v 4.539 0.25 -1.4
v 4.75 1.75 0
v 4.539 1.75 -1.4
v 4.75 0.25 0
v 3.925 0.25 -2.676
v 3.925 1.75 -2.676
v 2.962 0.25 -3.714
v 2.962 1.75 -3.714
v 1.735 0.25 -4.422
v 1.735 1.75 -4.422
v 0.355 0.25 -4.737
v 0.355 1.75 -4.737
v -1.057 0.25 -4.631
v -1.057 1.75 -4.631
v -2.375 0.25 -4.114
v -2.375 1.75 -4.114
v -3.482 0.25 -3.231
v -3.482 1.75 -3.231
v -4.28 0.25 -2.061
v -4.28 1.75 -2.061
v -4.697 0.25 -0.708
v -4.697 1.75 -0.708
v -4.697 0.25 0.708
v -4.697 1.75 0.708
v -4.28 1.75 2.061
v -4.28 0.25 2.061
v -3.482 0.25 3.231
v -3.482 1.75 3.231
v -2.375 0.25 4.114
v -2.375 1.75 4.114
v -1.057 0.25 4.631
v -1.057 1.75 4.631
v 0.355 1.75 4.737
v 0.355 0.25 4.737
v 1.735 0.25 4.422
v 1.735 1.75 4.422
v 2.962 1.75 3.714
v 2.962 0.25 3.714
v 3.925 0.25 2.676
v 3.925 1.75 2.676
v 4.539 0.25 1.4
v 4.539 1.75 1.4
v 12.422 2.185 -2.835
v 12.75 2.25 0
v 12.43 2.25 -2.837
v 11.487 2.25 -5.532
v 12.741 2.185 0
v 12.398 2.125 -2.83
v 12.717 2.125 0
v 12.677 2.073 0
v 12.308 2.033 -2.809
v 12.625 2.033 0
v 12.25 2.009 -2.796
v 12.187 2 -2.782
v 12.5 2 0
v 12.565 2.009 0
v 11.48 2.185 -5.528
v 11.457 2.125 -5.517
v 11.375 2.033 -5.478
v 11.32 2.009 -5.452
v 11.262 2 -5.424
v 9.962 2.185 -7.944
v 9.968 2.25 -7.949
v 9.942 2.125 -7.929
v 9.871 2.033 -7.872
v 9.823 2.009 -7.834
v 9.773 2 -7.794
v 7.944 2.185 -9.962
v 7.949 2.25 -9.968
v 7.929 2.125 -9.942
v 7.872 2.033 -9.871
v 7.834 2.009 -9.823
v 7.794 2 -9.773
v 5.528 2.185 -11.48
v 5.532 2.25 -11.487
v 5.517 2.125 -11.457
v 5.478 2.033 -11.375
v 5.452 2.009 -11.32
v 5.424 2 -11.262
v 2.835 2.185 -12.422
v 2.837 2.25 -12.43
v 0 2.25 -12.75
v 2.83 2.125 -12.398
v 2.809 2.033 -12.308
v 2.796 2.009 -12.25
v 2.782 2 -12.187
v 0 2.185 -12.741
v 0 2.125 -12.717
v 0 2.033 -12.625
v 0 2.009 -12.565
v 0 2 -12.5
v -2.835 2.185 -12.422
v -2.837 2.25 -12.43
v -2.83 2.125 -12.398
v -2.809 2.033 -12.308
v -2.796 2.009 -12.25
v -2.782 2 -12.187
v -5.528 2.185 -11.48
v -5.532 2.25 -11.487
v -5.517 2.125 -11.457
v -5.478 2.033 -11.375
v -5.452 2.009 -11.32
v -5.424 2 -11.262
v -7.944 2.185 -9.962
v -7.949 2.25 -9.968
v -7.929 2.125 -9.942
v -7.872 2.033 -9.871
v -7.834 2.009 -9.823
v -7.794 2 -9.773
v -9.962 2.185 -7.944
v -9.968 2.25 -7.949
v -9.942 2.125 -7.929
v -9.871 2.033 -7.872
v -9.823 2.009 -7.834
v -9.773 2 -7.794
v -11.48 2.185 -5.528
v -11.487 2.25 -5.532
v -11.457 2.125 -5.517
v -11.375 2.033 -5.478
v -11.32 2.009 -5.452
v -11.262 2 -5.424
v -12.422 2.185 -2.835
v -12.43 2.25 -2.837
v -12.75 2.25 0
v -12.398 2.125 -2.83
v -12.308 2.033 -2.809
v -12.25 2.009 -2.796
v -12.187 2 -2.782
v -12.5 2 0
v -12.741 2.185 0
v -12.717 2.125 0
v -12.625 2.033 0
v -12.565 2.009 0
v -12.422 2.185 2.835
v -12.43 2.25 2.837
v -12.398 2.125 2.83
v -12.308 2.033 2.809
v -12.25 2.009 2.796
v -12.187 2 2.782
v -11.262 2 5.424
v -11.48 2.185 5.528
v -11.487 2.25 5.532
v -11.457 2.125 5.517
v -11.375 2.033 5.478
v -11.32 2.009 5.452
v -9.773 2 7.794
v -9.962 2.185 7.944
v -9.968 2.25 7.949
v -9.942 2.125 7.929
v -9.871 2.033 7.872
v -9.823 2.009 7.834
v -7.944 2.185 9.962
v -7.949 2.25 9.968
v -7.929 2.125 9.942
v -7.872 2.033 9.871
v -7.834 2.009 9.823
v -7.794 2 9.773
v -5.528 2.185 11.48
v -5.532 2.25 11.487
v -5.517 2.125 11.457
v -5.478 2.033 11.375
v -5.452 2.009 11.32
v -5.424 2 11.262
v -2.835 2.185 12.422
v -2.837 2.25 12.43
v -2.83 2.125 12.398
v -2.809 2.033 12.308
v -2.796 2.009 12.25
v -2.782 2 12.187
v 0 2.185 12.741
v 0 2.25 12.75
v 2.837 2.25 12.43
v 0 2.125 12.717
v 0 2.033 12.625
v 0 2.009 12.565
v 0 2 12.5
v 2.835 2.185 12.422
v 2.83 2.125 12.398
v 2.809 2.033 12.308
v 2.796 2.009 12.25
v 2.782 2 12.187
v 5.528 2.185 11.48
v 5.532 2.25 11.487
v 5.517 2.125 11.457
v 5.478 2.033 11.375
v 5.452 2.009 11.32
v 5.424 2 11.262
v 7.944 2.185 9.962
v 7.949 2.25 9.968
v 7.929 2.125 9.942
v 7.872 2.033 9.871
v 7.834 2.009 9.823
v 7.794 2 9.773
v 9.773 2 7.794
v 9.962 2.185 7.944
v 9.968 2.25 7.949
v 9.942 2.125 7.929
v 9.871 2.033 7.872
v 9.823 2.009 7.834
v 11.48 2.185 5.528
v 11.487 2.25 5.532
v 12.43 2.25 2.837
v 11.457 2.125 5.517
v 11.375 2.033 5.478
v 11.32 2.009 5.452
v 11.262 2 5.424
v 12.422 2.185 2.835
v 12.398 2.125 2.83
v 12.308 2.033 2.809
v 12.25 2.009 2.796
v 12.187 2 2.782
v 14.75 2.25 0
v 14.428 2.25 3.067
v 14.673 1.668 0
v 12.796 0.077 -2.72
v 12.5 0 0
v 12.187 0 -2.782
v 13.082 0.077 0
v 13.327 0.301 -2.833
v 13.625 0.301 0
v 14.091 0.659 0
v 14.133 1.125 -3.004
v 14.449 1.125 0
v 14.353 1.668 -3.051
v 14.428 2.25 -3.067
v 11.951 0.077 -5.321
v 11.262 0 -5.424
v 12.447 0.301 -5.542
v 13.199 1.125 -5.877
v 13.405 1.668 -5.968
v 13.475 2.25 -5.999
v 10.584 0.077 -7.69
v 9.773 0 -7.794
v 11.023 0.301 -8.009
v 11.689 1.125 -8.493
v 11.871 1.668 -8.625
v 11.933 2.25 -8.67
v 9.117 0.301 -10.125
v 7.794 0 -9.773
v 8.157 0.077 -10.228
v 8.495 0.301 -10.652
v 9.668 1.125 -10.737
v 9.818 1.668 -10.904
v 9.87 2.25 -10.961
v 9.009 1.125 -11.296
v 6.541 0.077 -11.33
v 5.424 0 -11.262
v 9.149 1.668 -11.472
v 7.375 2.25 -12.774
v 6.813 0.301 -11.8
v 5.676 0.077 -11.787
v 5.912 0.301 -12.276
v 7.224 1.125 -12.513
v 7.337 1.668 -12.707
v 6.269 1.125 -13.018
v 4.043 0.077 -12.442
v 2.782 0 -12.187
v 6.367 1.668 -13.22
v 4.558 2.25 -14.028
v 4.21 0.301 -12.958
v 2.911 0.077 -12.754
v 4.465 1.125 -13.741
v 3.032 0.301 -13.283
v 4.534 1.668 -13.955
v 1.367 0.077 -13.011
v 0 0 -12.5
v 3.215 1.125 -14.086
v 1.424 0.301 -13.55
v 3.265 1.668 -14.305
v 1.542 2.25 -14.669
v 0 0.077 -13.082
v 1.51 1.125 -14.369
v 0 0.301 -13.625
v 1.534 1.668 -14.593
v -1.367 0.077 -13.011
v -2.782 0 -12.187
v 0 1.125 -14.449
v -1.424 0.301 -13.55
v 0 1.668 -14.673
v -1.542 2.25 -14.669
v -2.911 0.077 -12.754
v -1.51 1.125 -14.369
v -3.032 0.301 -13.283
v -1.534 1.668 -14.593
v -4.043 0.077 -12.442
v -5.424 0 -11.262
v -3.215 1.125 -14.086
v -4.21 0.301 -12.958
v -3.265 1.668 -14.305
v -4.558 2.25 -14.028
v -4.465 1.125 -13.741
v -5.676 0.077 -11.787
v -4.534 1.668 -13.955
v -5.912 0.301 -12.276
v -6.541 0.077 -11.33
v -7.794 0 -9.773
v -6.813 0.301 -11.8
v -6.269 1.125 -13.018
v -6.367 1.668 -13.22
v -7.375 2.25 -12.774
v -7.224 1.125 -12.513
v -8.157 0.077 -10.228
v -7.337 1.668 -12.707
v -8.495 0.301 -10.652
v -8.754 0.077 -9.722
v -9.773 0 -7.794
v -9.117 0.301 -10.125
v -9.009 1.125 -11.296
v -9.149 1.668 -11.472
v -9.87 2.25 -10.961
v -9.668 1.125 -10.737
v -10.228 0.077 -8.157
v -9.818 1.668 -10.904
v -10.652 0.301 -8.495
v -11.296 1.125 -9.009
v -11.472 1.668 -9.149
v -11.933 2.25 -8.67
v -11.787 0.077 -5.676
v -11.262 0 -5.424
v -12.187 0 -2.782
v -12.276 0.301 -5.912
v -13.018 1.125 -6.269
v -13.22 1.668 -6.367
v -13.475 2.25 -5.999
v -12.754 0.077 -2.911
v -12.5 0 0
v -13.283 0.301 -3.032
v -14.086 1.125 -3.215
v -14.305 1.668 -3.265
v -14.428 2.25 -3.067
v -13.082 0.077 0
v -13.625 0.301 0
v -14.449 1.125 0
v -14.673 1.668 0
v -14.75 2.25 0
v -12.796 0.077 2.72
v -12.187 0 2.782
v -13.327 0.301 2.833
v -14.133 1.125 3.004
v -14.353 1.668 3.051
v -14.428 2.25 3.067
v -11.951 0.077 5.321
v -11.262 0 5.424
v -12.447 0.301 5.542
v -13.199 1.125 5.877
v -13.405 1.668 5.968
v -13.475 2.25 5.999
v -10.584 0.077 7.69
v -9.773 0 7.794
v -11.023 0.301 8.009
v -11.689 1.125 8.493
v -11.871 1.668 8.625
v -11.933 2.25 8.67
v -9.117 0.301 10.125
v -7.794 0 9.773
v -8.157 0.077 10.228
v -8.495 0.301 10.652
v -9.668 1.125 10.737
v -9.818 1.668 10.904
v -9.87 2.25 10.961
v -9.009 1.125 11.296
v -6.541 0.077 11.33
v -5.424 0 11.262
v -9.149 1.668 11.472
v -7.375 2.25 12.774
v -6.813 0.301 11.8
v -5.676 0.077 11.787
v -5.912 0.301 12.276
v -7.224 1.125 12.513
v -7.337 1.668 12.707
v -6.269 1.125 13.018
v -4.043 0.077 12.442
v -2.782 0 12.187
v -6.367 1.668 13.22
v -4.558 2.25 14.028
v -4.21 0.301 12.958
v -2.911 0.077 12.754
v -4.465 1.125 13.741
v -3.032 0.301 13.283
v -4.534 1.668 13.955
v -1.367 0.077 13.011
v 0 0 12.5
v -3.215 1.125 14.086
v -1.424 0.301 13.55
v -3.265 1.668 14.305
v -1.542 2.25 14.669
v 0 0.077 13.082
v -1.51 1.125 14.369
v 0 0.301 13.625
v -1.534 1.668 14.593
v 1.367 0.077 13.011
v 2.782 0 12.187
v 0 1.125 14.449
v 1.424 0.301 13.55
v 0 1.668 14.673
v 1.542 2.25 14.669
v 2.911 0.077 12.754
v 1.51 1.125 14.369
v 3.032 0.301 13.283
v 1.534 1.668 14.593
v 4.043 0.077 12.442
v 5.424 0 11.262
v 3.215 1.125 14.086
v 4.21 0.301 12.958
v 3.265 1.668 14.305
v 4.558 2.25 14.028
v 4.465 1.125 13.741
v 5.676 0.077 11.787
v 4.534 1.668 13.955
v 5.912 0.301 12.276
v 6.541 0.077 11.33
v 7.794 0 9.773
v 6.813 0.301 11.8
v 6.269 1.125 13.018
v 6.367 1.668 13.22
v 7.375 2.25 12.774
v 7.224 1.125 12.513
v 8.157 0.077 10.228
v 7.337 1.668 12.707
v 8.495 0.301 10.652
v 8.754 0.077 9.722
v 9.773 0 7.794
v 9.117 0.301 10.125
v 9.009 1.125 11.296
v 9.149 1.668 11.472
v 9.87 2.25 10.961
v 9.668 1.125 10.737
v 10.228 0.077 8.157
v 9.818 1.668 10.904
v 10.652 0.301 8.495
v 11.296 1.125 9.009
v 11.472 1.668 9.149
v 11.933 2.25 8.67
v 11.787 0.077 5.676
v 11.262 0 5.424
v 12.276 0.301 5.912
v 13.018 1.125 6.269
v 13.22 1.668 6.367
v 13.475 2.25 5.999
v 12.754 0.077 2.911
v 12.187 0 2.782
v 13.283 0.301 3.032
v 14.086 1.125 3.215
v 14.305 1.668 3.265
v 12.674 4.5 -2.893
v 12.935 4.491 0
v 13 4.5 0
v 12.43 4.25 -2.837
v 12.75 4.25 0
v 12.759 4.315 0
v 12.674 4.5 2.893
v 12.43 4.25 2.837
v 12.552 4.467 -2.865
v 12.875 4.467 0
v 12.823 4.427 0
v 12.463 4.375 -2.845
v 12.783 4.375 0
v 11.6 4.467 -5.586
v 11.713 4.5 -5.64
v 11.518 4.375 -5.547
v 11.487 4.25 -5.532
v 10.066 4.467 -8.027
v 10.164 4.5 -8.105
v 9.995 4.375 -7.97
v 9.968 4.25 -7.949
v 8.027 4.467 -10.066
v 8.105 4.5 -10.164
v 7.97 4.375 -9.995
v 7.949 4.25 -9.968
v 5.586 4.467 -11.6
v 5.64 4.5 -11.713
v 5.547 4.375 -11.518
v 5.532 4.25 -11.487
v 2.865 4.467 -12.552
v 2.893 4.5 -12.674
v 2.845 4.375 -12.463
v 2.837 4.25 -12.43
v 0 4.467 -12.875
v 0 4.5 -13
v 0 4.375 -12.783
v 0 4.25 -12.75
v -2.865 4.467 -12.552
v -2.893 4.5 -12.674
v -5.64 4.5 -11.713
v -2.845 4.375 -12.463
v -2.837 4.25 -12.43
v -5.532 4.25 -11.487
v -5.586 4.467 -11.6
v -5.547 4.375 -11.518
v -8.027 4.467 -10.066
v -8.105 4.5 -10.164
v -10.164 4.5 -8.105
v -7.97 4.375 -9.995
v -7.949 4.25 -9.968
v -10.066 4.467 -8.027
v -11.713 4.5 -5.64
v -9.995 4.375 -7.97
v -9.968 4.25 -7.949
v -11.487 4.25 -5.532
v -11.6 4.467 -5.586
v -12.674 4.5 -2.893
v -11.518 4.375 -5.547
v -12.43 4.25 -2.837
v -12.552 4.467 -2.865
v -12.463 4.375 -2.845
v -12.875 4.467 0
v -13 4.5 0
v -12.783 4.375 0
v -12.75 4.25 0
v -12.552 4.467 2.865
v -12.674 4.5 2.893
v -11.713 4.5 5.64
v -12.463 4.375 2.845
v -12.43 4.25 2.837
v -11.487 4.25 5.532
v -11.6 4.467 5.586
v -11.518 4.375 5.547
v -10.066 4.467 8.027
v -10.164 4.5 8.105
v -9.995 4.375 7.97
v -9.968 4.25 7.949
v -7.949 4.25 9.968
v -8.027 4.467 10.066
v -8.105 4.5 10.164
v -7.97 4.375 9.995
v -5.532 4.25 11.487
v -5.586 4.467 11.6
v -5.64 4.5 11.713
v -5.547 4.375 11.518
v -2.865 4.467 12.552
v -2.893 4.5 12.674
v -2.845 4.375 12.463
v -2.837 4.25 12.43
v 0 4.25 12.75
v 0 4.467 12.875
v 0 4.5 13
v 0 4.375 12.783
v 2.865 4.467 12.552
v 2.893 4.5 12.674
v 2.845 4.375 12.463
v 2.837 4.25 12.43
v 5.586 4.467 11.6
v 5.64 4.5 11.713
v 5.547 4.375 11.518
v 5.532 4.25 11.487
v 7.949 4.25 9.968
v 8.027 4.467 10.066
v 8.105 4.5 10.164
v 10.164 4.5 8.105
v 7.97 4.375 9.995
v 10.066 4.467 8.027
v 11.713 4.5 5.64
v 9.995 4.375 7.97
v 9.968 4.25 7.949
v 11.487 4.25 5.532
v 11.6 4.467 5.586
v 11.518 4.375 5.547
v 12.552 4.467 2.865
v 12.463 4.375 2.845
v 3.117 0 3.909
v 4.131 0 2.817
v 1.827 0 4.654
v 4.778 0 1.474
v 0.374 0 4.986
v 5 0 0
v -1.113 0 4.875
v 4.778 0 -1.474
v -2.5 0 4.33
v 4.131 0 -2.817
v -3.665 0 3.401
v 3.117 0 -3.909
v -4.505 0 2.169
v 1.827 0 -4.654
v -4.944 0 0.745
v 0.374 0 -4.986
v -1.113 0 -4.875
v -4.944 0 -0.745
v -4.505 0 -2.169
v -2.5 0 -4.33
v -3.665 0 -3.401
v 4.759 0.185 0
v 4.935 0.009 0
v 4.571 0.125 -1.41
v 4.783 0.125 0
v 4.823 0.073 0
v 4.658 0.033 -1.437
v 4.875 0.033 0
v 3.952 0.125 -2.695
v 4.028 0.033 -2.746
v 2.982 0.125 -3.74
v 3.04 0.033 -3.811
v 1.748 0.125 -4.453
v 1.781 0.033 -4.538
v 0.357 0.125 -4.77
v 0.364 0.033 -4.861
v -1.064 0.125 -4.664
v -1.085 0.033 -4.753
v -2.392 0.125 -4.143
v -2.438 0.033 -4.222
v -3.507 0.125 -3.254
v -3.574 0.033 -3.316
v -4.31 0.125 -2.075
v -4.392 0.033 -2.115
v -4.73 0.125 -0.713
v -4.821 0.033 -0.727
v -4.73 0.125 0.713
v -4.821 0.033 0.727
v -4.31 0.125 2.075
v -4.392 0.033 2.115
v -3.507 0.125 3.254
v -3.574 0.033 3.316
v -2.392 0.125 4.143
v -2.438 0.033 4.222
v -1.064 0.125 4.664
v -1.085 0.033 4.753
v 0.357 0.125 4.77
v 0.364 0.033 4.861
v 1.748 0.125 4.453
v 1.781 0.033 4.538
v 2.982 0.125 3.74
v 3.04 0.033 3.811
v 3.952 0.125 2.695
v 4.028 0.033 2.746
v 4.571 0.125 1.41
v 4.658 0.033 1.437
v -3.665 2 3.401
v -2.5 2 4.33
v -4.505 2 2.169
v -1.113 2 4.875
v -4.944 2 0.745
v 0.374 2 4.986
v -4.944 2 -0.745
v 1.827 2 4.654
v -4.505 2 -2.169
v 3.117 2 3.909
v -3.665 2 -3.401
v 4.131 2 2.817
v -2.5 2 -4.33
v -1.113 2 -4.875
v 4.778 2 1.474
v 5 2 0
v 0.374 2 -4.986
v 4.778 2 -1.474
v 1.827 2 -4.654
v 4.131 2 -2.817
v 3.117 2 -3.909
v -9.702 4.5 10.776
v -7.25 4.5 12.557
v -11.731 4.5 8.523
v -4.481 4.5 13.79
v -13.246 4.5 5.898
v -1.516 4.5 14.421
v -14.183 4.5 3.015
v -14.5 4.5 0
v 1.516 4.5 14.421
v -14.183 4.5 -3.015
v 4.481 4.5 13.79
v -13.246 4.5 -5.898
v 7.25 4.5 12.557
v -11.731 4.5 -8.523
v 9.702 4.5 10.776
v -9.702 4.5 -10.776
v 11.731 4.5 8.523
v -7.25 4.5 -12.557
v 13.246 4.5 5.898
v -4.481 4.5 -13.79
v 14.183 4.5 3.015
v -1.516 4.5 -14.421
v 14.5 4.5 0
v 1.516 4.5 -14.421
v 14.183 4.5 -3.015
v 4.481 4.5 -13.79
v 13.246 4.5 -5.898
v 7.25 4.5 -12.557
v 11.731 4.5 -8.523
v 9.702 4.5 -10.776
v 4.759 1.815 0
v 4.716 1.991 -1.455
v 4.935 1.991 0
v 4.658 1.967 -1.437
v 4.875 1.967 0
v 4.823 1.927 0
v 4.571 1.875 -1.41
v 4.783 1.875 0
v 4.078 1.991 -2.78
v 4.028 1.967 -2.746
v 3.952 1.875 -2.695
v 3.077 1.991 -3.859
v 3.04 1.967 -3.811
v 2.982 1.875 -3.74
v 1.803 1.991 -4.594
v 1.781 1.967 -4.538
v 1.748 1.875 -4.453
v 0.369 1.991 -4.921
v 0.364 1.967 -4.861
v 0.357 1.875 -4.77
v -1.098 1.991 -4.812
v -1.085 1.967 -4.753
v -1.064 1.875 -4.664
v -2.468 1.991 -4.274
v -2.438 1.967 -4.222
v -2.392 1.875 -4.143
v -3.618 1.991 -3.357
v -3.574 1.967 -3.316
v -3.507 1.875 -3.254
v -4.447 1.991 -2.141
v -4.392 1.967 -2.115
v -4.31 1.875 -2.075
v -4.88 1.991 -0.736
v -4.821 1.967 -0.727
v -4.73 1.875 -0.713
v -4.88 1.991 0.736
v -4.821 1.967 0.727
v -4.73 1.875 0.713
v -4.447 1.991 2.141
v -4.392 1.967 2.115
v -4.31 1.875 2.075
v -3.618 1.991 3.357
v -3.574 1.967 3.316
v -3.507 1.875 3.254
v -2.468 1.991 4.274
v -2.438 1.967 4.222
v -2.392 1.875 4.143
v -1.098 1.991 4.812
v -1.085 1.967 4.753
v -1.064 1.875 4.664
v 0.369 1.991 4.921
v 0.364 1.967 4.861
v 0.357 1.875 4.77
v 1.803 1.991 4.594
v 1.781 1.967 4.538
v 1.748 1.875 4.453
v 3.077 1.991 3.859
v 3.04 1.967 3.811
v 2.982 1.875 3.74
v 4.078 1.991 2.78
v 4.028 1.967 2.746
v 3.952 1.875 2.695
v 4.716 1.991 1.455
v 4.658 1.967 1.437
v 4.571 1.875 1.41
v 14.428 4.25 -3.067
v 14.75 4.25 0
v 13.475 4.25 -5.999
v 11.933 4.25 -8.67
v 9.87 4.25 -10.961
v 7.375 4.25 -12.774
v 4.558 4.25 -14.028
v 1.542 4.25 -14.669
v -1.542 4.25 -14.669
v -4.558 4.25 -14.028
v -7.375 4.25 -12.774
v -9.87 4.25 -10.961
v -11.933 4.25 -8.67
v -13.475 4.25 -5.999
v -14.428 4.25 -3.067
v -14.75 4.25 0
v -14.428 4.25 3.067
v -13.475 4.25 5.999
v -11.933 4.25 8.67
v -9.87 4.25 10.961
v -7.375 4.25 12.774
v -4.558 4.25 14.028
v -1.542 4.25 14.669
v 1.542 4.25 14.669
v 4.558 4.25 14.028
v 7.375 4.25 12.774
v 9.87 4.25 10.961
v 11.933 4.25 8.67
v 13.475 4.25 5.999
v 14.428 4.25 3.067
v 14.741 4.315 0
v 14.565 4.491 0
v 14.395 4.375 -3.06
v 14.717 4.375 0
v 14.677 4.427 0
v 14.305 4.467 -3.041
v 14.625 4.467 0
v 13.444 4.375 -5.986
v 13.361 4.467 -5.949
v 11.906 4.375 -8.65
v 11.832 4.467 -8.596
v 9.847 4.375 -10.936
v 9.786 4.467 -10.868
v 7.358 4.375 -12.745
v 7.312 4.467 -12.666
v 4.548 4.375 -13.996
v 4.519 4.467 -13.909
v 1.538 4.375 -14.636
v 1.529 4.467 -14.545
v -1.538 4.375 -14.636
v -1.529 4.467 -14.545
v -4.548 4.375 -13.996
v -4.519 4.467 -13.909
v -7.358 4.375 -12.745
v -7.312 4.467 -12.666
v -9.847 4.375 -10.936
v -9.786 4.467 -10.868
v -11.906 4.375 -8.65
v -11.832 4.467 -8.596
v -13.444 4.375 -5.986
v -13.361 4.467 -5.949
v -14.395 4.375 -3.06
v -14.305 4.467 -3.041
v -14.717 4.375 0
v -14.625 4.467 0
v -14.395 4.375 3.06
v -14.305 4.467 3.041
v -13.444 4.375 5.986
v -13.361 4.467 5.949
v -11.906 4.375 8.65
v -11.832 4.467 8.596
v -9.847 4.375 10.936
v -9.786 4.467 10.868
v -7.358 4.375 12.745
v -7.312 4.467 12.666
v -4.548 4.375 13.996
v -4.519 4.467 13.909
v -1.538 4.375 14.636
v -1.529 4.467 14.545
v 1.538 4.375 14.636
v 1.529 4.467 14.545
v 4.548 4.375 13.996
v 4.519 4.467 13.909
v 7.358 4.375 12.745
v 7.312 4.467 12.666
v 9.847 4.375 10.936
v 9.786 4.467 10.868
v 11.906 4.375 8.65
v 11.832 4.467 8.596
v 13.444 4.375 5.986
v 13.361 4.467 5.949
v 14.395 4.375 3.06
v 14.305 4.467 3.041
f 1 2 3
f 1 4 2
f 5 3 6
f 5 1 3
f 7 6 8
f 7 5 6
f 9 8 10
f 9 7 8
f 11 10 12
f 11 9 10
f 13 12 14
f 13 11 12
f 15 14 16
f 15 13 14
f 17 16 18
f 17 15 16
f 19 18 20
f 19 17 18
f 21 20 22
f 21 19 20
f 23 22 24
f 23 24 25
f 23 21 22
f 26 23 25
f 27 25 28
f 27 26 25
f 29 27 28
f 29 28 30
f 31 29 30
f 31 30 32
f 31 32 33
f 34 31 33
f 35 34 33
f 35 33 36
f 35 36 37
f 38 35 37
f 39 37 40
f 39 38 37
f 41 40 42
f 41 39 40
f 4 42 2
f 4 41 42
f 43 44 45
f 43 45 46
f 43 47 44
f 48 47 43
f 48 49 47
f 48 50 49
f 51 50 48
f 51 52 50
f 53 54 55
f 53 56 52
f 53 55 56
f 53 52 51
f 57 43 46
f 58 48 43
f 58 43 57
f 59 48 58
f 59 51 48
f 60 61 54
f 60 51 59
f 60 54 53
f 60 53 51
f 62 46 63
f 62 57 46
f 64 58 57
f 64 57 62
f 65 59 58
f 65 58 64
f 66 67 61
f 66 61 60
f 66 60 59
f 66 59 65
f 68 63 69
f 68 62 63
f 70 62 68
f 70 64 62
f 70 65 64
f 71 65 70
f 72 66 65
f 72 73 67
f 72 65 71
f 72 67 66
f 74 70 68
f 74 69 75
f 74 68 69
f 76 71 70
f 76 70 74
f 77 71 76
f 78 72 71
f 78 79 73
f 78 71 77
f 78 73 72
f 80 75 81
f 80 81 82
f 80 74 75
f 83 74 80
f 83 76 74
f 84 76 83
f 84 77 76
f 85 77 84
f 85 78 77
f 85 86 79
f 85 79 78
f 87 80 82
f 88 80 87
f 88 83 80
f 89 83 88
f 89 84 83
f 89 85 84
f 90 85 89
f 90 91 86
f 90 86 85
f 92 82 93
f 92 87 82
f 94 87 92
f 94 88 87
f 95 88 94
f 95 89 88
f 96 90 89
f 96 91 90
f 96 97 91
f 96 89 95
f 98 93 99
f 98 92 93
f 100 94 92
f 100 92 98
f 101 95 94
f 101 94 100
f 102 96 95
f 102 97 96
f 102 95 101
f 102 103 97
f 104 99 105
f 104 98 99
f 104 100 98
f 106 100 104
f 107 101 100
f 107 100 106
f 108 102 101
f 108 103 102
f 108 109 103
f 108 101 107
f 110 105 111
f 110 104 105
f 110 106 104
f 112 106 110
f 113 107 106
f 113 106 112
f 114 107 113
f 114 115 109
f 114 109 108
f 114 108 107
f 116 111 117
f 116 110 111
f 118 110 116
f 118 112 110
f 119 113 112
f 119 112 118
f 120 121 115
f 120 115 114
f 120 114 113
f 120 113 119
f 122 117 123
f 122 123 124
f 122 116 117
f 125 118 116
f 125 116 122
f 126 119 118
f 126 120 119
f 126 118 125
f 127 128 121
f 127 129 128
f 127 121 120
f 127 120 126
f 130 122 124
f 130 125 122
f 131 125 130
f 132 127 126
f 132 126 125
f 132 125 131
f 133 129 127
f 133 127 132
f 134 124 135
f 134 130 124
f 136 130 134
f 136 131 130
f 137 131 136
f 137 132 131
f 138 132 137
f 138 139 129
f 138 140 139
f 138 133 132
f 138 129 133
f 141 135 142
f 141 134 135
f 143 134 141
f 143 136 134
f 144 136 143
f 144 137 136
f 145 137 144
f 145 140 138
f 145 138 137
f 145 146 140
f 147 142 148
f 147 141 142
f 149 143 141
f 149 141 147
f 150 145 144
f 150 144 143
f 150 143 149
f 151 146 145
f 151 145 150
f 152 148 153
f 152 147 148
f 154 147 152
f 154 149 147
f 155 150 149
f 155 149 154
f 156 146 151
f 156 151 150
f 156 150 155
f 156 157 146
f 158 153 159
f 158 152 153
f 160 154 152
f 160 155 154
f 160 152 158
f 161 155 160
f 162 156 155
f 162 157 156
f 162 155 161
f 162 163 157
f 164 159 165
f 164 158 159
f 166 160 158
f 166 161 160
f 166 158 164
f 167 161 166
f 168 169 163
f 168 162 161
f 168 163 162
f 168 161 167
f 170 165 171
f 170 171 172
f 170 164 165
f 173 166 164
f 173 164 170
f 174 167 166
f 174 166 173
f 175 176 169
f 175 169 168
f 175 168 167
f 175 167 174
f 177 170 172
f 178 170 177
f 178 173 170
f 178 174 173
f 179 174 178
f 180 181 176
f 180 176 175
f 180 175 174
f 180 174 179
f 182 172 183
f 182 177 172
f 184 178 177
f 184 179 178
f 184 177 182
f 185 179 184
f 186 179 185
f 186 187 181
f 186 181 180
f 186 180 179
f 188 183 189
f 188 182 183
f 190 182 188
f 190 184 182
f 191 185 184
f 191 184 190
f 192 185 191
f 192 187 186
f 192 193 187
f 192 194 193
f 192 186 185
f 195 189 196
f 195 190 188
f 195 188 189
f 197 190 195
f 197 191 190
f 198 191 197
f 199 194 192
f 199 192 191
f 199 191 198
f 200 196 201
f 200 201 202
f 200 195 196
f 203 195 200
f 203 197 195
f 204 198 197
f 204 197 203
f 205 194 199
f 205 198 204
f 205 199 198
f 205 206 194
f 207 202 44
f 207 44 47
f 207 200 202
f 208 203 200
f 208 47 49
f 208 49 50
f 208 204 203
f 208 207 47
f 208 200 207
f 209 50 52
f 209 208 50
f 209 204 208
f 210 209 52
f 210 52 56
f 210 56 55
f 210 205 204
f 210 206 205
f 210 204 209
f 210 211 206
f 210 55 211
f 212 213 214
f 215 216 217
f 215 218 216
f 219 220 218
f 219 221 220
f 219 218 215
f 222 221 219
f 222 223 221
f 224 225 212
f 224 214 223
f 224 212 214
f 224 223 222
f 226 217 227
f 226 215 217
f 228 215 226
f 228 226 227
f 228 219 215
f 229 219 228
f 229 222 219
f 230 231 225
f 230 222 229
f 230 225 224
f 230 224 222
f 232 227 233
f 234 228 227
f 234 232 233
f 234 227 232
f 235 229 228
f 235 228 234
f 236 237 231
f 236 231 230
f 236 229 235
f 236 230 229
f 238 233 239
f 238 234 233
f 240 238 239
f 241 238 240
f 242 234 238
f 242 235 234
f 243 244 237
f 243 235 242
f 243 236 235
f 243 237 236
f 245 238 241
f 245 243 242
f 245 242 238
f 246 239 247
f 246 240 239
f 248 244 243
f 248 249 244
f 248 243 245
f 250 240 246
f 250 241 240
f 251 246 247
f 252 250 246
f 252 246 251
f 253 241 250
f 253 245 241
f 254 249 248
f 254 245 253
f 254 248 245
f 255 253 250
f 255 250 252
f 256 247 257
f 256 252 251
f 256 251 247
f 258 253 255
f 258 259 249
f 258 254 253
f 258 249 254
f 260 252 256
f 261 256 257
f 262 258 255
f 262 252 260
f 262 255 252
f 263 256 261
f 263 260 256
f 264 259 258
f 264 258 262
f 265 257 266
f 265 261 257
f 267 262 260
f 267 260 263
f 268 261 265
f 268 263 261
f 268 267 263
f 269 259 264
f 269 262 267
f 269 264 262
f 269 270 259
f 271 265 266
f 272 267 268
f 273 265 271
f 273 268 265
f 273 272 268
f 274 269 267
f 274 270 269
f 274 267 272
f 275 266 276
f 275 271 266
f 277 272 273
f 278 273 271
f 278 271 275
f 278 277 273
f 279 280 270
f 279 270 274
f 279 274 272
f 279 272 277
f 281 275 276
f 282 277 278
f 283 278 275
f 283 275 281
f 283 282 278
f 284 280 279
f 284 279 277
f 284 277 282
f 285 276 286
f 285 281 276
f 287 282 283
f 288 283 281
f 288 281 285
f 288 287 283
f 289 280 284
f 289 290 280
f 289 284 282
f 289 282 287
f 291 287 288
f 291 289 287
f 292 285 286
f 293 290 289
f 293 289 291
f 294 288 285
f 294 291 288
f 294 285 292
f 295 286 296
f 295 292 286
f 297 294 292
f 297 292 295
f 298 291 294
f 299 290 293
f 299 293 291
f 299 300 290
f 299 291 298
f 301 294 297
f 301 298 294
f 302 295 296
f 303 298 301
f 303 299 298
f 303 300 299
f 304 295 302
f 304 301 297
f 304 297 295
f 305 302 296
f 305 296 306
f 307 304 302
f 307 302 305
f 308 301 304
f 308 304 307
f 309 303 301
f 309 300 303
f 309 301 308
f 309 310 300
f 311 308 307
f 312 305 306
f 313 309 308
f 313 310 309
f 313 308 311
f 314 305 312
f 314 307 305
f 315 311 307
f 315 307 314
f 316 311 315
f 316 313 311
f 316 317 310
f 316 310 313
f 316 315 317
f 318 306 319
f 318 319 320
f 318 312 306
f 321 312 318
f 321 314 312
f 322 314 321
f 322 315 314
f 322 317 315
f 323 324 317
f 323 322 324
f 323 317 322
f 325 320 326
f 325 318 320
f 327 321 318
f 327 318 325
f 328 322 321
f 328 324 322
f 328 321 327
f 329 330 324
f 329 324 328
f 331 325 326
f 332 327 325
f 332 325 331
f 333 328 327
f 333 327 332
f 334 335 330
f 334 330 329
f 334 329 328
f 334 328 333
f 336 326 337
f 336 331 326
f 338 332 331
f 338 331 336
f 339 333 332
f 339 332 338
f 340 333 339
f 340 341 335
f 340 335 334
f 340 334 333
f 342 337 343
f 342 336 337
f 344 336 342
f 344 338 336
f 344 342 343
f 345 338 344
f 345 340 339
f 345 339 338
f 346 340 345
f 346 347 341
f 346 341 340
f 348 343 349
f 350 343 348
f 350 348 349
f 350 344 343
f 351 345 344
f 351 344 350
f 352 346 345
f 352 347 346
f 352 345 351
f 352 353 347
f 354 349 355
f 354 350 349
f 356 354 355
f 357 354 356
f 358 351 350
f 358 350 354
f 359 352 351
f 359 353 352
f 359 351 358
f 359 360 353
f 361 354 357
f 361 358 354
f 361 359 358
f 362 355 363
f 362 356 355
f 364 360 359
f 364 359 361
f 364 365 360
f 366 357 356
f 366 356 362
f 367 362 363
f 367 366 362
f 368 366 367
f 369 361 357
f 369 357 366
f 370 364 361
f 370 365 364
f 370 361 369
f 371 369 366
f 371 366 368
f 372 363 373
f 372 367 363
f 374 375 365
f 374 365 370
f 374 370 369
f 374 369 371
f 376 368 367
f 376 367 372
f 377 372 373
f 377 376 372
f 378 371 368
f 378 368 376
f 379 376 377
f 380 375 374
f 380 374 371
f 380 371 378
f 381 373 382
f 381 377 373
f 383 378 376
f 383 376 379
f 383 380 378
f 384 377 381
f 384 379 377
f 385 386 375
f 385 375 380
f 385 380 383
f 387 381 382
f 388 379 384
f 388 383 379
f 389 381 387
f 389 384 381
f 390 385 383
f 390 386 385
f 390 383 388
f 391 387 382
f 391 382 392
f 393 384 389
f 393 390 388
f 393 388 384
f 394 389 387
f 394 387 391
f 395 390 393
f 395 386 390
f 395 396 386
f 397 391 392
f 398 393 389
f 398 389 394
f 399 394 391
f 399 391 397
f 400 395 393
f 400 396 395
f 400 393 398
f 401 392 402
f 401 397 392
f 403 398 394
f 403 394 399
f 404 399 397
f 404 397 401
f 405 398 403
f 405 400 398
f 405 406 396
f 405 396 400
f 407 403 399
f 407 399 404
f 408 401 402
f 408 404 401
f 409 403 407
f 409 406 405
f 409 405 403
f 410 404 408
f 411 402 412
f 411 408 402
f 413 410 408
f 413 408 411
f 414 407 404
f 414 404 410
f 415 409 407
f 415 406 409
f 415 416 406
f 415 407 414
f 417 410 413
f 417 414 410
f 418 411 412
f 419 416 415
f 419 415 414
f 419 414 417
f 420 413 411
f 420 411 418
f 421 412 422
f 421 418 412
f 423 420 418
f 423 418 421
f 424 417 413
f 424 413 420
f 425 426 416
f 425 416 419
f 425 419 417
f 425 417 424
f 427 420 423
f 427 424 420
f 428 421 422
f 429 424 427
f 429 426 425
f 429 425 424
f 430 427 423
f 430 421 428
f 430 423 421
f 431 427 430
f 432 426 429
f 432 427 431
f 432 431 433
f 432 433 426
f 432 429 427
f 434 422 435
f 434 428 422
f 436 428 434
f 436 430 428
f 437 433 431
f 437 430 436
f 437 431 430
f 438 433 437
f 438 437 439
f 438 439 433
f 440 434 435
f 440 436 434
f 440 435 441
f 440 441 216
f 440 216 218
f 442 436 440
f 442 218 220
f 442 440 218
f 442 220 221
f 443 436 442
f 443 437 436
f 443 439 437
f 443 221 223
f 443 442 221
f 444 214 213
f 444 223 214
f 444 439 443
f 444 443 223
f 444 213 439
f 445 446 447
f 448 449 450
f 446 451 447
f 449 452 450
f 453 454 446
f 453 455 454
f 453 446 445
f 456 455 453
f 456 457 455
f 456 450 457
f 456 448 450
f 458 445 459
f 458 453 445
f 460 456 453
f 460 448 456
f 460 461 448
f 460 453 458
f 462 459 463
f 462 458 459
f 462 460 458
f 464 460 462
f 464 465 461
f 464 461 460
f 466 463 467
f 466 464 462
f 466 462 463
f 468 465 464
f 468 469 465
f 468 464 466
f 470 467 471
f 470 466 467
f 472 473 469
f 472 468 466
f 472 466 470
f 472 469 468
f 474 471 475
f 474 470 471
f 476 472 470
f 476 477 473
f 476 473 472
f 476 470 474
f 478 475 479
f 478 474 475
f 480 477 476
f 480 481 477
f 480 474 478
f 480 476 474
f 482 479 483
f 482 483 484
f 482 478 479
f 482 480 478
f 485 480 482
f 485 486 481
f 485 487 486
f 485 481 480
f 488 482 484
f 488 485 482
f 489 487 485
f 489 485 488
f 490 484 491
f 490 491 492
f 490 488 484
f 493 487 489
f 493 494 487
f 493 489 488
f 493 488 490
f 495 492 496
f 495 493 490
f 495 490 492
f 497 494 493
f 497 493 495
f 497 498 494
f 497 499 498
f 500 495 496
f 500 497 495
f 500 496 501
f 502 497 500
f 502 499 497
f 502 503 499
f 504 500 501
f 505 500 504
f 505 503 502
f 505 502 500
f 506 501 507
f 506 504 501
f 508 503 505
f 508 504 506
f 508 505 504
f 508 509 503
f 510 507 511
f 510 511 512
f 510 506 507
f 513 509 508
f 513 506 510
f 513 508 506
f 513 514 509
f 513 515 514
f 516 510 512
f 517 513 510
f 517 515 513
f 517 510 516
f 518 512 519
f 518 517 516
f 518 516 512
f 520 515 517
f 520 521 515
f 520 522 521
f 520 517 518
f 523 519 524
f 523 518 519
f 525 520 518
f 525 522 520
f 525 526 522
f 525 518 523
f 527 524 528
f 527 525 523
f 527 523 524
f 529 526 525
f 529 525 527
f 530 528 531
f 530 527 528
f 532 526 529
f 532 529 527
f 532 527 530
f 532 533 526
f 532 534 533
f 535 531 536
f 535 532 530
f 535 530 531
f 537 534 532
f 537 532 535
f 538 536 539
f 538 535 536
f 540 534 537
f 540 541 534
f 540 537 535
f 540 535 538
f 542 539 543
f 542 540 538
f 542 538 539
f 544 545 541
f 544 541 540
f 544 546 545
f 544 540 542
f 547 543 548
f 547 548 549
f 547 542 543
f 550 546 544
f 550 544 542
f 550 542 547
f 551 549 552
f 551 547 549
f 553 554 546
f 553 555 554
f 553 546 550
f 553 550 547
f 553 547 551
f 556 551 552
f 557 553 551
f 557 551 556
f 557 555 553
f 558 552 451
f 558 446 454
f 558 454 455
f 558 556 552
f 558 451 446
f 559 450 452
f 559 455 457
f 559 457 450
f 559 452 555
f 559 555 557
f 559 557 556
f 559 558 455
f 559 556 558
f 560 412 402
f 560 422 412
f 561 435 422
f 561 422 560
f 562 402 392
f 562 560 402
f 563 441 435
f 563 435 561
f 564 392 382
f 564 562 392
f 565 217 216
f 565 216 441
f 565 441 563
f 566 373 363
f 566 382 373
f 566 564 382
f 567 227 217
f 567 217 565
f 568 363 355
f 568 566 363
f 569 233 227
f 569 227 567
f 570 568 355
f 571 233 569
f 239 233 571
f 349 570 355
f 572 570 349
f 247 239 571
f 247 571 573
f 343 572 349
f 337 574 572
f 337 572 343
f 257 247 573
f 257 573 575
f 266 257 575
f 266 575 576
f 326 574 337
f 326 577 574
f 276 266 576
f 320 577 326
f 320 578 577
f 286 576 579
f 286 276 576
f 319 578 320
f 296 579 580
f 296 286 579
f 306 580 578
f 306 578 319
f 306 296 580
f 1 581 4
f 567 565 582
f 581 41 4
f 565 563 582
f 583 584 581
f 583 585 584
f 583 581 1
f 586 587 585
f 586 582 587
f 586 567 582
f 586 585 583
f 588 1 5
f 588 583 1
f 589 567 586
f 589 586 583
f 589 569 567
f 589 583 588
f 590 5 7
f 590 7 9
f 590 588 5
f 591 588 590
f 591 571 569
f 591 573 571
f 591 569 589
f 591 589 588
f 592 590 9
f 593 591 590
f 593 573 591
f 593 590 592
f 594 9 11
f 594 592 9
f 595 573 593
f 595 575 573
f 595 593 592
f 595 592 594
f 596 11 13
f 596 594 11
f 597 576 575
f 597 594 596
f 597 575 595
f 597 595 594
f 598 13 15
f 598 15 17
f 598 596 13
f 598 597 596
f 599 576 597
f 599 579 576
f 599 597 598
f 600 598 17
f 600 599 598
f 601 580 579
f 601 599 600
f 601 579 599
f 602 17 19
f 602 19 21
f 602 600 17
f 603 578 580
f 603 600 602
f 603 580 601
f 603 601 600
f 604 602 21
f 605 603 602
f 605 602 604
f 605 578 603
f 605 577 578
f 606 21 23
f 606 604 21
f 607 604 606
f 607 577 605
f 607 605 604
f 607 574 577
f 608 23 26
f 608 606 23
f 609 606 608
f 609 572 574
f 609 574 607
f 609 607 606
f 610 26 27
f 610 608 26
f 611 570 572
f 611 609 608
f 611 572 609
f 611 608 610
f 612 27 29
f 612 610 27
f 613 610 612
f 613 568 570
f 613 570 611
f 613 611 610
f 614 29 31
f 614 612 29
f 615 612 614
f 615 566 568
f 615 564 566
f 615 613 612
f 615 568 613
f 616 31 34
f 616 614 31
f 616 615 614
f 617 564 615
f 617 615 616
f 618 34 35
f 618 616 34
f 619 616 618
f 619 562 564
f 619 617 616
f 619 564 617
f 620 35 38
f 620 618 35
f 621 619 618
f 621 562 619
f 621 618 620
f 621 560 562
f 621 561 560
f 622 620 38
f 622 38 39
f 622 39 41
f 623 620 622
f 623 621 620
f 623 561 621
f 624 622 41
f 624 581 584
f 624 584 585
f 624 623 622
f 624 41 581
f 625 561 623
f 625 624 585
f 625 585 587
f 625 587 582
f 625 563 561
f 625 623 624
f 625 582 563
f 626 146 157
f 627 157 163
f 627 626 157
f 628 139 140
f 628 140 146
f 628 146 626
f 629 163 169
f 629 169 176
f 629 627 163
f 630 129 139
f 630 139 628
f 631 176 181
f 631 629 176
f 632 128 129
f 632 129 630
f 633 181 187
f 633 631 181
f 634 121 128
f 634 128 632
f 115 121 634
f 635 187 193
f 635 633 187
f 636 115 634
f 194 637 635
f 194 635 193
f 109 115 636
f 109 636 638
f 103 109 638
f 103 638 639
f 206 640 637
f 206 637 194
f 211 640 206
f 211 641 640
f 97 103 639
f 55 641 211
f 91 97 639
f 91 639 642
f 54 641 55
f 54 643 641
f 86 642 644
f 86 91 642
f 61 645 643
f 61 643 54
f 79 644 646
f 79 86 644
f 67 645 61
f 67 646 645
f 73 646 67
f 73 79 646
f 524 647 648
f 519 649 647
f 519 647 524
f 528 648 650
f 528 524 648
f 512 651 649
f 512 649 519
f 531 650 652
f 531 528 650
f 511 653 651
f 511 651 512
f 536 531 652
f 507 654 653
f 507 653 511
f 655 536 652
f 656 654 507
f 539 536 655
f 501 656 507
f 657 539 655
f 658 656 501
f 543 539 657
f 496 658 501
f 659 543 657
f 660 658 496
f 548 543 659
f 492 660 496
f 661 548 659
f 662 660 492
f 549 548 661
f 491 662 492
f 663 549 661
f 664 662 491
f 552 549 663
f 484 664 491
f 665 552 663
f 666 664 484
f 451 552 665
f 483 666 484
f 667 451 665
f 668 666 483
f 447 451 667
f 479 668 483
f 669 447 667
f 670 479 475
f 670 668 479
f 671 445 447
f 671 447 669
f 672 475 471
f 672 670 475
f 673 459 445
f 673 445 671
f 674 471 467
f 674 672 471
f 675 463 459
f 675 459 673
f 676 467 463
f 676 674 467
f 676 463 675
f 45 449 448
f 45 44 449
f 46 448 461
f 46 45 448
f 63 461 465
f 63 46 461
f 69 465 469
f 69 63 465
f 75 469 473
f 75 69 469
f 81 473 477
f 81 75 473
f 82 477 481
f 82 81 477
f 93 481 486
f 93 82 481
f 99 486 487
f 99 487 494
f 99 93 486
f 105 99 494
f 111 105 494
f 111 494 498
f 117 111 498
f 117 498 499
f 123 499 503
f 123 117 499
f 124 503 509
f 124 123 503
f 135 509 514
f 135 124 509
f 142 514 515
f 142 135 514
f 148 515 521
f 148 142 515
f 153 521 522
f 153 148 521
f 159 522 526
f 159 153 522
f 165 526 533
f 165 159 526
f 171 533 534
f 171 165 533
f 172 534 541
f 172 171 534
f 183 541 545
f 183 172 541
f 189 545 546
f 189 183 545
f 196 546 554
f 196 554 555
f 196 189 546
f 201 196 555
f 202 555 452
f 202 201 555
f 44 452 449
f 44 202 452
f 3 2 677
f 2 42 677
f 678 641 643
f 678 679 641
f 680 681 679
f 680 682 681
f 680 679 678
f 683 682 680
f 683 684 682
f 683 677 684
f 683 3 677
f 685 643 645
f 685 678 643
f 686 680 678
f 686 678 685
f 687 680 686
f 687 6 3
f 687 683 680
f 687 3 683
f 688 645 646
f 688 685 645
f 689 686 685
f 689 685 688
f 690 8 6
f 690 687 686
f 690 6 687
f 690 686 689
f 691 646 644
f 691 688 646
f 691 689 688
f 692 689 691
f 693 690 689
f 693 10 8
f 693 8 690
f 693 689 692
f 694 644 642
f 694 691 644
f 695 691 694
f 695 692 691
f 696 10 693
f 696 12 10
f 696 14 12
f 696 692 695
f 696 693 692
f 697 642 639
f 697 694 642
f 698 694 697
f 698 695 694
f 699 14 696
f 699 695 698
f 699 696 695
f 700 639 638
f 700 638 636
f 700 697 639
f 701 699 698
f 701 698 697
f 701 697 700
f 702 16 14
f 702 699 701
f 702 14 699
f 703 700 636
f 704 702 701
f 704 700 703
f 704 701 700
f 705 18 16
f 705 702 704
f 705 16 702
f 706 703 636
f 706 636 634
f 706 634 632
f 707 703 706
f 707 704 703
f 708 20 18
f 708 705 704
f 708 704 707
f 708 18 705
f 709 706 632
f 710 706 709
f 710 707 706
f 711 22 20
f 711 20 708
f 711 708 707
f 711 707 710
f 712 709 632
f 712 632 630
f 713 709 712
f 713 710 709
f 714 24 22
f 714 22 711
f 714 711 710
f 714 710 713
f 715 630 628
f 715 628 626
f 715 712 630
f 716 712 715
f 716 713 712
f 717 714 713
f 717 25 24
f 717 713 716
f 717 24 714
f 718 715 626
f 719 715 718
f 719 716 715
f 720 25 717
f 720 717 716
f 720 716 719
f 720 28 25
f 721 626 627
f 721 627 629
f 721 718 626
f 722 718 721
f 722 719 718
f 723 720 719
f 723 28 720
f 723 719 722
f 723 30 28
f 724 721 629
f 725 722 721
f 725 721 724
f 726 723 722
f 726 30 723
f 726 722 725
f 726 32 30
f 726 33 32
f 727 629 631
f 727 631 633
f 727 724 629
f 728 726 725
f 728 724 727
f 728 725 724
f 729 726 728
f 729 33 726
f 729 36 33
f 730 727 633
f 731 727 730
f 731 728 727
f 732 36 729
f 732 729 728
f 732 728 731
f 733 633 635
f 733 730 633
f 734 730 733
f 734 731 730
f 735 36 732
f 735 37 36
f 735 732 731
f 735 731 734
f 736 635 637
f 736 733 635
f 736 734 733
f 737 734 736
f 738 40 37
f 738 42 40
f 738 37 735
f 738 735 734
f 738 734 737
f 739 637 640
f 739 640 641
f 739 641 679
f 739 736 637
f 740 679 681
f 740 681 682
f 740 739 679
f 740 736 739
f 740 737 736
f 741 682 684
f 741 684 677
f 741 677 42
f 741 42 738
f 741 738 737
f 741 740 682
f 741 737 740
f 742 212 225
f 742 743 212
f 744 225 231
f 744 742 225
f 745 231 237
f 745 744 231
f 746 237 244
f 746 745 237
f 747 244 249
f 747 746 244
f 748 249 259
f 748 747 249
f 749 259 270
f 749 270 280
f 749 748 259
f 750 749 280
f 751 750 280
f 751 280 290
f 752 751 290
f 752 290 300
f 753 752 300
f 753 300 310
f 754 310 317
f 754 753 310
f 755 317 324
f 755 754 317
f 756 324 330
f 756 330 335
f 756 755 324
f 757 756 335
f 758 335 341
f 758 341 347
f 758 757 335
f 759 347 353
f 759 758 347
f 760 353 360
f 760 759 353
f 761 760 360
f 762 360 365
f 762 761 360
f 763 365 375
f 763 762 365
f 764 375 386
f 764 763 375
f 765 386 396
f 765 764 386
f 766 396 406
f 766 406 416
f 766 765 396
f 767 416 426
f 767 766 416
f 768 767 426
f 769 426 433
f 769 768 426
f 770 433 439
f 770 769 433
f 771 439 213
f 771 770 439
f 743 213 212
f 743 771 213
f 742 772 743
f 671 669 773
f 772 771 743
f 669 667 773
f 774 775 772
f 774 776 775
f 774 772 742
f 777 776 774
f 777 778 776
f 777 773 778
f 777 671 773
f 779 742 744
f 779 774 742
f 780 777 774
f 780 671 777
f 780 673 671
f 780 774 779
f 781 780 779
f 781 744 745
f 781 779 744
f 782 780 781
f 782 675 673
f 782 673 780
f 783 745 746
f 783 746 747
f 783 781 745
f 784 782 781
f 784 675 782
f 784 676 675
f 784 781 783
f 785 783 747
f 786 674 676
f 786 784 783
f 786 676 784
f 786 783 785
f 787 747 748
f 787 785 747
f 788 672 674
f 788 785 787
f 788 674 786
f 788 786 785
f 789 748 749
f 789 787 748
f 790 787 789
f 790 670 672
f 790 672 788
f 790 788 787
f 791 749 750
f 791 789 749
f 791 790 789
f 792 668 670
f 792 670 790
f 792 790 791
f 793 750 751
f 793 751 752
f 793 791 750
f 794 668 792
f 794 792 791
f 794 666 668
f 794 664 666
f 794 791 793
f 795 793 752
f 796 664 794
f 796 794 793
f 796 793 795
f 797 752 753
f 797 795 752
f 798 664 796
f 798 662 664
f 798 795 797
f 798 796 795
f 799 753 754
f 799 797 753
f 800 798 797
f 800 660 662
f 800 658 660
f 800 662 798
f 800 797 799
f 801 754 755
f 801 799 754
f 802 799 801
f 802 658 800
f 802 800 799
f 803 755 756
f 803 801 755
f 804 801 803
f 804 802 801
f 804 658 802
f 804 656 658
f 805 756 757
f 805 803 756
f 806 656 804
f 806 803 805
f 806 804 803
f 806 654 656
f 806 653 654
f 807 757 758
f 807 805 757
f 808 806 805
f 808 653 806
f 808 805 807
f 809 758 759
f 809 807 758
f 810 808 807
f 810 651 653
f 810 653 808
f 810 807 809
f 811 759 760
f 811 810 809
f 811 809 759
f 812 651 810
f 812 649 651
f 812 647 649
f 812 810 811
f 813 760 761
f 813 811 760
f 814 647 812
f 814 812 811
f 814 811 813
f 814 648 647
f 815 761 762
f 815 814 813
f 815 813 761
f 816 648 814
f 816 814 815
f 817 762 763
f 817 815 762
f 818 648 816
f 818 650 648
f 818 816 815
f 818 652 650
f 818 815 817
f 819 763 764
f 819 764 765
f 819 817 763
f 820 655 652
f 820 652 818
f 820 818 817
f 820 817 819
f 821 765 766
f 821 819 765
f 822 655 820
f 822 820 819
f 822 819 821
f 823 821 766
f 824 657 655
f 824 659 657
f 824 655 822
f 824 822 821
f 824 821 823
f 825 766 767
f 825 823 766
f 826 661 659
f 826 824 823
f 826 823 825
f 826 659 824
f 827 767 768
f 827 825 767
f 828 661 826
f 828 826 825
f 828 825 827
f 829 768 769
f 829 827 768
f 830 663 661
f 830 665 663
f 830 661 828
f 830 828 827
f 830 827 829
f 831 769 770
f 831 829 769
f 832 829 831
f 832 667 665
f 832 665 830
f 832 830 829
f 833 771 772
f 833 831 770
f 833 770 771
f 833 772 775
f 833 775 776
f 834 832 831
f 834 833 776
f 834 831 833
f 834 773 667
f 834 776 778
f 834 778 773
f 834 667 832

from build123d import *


with BuildPart() as part:
    # Sketch1 → Revolve1 (revolve)
    with BuildSketch(Plane.XY):
        with BuildLine():
            Line((5, 0), (12.5, 0))
            ThreePointArc((12.5, 0), (14.090990258, 0.659009742), (14.75, 2.25))
            Line((14.75, 2.25), (14.75, 4.25))
            ThreePointArc((14.75, 4.25), (14.676776695, 4.426776695), (14.5, 4.5))
            Line((14.5, 4.5), (13, 4.5))
            ThreePointArc((13, 4.5), (12.823223305, 4.426776695), (12.75, 4.25))
            Line((12.75, 4.25), (12.75, 2.25))
            ThreePointArc((12.75, 2.25), (12.676776695, 2.073223305), (12.5, 2))
            Line((12.5, 2), (5, 2))
            ThreePointArc((5, 2), (4.823223305, 1.926776695), (4.75, 1.75))
            Line((4.75, 1.75), (4.75, 0.25))
            ThreePointArc((4.75, 0.25), (4.823223305, 0.073223305), (5, 0))
        make_face()
    revolve(axis=Axis((0, 0, 0), (0, 1, 0)))


solid = part.part
